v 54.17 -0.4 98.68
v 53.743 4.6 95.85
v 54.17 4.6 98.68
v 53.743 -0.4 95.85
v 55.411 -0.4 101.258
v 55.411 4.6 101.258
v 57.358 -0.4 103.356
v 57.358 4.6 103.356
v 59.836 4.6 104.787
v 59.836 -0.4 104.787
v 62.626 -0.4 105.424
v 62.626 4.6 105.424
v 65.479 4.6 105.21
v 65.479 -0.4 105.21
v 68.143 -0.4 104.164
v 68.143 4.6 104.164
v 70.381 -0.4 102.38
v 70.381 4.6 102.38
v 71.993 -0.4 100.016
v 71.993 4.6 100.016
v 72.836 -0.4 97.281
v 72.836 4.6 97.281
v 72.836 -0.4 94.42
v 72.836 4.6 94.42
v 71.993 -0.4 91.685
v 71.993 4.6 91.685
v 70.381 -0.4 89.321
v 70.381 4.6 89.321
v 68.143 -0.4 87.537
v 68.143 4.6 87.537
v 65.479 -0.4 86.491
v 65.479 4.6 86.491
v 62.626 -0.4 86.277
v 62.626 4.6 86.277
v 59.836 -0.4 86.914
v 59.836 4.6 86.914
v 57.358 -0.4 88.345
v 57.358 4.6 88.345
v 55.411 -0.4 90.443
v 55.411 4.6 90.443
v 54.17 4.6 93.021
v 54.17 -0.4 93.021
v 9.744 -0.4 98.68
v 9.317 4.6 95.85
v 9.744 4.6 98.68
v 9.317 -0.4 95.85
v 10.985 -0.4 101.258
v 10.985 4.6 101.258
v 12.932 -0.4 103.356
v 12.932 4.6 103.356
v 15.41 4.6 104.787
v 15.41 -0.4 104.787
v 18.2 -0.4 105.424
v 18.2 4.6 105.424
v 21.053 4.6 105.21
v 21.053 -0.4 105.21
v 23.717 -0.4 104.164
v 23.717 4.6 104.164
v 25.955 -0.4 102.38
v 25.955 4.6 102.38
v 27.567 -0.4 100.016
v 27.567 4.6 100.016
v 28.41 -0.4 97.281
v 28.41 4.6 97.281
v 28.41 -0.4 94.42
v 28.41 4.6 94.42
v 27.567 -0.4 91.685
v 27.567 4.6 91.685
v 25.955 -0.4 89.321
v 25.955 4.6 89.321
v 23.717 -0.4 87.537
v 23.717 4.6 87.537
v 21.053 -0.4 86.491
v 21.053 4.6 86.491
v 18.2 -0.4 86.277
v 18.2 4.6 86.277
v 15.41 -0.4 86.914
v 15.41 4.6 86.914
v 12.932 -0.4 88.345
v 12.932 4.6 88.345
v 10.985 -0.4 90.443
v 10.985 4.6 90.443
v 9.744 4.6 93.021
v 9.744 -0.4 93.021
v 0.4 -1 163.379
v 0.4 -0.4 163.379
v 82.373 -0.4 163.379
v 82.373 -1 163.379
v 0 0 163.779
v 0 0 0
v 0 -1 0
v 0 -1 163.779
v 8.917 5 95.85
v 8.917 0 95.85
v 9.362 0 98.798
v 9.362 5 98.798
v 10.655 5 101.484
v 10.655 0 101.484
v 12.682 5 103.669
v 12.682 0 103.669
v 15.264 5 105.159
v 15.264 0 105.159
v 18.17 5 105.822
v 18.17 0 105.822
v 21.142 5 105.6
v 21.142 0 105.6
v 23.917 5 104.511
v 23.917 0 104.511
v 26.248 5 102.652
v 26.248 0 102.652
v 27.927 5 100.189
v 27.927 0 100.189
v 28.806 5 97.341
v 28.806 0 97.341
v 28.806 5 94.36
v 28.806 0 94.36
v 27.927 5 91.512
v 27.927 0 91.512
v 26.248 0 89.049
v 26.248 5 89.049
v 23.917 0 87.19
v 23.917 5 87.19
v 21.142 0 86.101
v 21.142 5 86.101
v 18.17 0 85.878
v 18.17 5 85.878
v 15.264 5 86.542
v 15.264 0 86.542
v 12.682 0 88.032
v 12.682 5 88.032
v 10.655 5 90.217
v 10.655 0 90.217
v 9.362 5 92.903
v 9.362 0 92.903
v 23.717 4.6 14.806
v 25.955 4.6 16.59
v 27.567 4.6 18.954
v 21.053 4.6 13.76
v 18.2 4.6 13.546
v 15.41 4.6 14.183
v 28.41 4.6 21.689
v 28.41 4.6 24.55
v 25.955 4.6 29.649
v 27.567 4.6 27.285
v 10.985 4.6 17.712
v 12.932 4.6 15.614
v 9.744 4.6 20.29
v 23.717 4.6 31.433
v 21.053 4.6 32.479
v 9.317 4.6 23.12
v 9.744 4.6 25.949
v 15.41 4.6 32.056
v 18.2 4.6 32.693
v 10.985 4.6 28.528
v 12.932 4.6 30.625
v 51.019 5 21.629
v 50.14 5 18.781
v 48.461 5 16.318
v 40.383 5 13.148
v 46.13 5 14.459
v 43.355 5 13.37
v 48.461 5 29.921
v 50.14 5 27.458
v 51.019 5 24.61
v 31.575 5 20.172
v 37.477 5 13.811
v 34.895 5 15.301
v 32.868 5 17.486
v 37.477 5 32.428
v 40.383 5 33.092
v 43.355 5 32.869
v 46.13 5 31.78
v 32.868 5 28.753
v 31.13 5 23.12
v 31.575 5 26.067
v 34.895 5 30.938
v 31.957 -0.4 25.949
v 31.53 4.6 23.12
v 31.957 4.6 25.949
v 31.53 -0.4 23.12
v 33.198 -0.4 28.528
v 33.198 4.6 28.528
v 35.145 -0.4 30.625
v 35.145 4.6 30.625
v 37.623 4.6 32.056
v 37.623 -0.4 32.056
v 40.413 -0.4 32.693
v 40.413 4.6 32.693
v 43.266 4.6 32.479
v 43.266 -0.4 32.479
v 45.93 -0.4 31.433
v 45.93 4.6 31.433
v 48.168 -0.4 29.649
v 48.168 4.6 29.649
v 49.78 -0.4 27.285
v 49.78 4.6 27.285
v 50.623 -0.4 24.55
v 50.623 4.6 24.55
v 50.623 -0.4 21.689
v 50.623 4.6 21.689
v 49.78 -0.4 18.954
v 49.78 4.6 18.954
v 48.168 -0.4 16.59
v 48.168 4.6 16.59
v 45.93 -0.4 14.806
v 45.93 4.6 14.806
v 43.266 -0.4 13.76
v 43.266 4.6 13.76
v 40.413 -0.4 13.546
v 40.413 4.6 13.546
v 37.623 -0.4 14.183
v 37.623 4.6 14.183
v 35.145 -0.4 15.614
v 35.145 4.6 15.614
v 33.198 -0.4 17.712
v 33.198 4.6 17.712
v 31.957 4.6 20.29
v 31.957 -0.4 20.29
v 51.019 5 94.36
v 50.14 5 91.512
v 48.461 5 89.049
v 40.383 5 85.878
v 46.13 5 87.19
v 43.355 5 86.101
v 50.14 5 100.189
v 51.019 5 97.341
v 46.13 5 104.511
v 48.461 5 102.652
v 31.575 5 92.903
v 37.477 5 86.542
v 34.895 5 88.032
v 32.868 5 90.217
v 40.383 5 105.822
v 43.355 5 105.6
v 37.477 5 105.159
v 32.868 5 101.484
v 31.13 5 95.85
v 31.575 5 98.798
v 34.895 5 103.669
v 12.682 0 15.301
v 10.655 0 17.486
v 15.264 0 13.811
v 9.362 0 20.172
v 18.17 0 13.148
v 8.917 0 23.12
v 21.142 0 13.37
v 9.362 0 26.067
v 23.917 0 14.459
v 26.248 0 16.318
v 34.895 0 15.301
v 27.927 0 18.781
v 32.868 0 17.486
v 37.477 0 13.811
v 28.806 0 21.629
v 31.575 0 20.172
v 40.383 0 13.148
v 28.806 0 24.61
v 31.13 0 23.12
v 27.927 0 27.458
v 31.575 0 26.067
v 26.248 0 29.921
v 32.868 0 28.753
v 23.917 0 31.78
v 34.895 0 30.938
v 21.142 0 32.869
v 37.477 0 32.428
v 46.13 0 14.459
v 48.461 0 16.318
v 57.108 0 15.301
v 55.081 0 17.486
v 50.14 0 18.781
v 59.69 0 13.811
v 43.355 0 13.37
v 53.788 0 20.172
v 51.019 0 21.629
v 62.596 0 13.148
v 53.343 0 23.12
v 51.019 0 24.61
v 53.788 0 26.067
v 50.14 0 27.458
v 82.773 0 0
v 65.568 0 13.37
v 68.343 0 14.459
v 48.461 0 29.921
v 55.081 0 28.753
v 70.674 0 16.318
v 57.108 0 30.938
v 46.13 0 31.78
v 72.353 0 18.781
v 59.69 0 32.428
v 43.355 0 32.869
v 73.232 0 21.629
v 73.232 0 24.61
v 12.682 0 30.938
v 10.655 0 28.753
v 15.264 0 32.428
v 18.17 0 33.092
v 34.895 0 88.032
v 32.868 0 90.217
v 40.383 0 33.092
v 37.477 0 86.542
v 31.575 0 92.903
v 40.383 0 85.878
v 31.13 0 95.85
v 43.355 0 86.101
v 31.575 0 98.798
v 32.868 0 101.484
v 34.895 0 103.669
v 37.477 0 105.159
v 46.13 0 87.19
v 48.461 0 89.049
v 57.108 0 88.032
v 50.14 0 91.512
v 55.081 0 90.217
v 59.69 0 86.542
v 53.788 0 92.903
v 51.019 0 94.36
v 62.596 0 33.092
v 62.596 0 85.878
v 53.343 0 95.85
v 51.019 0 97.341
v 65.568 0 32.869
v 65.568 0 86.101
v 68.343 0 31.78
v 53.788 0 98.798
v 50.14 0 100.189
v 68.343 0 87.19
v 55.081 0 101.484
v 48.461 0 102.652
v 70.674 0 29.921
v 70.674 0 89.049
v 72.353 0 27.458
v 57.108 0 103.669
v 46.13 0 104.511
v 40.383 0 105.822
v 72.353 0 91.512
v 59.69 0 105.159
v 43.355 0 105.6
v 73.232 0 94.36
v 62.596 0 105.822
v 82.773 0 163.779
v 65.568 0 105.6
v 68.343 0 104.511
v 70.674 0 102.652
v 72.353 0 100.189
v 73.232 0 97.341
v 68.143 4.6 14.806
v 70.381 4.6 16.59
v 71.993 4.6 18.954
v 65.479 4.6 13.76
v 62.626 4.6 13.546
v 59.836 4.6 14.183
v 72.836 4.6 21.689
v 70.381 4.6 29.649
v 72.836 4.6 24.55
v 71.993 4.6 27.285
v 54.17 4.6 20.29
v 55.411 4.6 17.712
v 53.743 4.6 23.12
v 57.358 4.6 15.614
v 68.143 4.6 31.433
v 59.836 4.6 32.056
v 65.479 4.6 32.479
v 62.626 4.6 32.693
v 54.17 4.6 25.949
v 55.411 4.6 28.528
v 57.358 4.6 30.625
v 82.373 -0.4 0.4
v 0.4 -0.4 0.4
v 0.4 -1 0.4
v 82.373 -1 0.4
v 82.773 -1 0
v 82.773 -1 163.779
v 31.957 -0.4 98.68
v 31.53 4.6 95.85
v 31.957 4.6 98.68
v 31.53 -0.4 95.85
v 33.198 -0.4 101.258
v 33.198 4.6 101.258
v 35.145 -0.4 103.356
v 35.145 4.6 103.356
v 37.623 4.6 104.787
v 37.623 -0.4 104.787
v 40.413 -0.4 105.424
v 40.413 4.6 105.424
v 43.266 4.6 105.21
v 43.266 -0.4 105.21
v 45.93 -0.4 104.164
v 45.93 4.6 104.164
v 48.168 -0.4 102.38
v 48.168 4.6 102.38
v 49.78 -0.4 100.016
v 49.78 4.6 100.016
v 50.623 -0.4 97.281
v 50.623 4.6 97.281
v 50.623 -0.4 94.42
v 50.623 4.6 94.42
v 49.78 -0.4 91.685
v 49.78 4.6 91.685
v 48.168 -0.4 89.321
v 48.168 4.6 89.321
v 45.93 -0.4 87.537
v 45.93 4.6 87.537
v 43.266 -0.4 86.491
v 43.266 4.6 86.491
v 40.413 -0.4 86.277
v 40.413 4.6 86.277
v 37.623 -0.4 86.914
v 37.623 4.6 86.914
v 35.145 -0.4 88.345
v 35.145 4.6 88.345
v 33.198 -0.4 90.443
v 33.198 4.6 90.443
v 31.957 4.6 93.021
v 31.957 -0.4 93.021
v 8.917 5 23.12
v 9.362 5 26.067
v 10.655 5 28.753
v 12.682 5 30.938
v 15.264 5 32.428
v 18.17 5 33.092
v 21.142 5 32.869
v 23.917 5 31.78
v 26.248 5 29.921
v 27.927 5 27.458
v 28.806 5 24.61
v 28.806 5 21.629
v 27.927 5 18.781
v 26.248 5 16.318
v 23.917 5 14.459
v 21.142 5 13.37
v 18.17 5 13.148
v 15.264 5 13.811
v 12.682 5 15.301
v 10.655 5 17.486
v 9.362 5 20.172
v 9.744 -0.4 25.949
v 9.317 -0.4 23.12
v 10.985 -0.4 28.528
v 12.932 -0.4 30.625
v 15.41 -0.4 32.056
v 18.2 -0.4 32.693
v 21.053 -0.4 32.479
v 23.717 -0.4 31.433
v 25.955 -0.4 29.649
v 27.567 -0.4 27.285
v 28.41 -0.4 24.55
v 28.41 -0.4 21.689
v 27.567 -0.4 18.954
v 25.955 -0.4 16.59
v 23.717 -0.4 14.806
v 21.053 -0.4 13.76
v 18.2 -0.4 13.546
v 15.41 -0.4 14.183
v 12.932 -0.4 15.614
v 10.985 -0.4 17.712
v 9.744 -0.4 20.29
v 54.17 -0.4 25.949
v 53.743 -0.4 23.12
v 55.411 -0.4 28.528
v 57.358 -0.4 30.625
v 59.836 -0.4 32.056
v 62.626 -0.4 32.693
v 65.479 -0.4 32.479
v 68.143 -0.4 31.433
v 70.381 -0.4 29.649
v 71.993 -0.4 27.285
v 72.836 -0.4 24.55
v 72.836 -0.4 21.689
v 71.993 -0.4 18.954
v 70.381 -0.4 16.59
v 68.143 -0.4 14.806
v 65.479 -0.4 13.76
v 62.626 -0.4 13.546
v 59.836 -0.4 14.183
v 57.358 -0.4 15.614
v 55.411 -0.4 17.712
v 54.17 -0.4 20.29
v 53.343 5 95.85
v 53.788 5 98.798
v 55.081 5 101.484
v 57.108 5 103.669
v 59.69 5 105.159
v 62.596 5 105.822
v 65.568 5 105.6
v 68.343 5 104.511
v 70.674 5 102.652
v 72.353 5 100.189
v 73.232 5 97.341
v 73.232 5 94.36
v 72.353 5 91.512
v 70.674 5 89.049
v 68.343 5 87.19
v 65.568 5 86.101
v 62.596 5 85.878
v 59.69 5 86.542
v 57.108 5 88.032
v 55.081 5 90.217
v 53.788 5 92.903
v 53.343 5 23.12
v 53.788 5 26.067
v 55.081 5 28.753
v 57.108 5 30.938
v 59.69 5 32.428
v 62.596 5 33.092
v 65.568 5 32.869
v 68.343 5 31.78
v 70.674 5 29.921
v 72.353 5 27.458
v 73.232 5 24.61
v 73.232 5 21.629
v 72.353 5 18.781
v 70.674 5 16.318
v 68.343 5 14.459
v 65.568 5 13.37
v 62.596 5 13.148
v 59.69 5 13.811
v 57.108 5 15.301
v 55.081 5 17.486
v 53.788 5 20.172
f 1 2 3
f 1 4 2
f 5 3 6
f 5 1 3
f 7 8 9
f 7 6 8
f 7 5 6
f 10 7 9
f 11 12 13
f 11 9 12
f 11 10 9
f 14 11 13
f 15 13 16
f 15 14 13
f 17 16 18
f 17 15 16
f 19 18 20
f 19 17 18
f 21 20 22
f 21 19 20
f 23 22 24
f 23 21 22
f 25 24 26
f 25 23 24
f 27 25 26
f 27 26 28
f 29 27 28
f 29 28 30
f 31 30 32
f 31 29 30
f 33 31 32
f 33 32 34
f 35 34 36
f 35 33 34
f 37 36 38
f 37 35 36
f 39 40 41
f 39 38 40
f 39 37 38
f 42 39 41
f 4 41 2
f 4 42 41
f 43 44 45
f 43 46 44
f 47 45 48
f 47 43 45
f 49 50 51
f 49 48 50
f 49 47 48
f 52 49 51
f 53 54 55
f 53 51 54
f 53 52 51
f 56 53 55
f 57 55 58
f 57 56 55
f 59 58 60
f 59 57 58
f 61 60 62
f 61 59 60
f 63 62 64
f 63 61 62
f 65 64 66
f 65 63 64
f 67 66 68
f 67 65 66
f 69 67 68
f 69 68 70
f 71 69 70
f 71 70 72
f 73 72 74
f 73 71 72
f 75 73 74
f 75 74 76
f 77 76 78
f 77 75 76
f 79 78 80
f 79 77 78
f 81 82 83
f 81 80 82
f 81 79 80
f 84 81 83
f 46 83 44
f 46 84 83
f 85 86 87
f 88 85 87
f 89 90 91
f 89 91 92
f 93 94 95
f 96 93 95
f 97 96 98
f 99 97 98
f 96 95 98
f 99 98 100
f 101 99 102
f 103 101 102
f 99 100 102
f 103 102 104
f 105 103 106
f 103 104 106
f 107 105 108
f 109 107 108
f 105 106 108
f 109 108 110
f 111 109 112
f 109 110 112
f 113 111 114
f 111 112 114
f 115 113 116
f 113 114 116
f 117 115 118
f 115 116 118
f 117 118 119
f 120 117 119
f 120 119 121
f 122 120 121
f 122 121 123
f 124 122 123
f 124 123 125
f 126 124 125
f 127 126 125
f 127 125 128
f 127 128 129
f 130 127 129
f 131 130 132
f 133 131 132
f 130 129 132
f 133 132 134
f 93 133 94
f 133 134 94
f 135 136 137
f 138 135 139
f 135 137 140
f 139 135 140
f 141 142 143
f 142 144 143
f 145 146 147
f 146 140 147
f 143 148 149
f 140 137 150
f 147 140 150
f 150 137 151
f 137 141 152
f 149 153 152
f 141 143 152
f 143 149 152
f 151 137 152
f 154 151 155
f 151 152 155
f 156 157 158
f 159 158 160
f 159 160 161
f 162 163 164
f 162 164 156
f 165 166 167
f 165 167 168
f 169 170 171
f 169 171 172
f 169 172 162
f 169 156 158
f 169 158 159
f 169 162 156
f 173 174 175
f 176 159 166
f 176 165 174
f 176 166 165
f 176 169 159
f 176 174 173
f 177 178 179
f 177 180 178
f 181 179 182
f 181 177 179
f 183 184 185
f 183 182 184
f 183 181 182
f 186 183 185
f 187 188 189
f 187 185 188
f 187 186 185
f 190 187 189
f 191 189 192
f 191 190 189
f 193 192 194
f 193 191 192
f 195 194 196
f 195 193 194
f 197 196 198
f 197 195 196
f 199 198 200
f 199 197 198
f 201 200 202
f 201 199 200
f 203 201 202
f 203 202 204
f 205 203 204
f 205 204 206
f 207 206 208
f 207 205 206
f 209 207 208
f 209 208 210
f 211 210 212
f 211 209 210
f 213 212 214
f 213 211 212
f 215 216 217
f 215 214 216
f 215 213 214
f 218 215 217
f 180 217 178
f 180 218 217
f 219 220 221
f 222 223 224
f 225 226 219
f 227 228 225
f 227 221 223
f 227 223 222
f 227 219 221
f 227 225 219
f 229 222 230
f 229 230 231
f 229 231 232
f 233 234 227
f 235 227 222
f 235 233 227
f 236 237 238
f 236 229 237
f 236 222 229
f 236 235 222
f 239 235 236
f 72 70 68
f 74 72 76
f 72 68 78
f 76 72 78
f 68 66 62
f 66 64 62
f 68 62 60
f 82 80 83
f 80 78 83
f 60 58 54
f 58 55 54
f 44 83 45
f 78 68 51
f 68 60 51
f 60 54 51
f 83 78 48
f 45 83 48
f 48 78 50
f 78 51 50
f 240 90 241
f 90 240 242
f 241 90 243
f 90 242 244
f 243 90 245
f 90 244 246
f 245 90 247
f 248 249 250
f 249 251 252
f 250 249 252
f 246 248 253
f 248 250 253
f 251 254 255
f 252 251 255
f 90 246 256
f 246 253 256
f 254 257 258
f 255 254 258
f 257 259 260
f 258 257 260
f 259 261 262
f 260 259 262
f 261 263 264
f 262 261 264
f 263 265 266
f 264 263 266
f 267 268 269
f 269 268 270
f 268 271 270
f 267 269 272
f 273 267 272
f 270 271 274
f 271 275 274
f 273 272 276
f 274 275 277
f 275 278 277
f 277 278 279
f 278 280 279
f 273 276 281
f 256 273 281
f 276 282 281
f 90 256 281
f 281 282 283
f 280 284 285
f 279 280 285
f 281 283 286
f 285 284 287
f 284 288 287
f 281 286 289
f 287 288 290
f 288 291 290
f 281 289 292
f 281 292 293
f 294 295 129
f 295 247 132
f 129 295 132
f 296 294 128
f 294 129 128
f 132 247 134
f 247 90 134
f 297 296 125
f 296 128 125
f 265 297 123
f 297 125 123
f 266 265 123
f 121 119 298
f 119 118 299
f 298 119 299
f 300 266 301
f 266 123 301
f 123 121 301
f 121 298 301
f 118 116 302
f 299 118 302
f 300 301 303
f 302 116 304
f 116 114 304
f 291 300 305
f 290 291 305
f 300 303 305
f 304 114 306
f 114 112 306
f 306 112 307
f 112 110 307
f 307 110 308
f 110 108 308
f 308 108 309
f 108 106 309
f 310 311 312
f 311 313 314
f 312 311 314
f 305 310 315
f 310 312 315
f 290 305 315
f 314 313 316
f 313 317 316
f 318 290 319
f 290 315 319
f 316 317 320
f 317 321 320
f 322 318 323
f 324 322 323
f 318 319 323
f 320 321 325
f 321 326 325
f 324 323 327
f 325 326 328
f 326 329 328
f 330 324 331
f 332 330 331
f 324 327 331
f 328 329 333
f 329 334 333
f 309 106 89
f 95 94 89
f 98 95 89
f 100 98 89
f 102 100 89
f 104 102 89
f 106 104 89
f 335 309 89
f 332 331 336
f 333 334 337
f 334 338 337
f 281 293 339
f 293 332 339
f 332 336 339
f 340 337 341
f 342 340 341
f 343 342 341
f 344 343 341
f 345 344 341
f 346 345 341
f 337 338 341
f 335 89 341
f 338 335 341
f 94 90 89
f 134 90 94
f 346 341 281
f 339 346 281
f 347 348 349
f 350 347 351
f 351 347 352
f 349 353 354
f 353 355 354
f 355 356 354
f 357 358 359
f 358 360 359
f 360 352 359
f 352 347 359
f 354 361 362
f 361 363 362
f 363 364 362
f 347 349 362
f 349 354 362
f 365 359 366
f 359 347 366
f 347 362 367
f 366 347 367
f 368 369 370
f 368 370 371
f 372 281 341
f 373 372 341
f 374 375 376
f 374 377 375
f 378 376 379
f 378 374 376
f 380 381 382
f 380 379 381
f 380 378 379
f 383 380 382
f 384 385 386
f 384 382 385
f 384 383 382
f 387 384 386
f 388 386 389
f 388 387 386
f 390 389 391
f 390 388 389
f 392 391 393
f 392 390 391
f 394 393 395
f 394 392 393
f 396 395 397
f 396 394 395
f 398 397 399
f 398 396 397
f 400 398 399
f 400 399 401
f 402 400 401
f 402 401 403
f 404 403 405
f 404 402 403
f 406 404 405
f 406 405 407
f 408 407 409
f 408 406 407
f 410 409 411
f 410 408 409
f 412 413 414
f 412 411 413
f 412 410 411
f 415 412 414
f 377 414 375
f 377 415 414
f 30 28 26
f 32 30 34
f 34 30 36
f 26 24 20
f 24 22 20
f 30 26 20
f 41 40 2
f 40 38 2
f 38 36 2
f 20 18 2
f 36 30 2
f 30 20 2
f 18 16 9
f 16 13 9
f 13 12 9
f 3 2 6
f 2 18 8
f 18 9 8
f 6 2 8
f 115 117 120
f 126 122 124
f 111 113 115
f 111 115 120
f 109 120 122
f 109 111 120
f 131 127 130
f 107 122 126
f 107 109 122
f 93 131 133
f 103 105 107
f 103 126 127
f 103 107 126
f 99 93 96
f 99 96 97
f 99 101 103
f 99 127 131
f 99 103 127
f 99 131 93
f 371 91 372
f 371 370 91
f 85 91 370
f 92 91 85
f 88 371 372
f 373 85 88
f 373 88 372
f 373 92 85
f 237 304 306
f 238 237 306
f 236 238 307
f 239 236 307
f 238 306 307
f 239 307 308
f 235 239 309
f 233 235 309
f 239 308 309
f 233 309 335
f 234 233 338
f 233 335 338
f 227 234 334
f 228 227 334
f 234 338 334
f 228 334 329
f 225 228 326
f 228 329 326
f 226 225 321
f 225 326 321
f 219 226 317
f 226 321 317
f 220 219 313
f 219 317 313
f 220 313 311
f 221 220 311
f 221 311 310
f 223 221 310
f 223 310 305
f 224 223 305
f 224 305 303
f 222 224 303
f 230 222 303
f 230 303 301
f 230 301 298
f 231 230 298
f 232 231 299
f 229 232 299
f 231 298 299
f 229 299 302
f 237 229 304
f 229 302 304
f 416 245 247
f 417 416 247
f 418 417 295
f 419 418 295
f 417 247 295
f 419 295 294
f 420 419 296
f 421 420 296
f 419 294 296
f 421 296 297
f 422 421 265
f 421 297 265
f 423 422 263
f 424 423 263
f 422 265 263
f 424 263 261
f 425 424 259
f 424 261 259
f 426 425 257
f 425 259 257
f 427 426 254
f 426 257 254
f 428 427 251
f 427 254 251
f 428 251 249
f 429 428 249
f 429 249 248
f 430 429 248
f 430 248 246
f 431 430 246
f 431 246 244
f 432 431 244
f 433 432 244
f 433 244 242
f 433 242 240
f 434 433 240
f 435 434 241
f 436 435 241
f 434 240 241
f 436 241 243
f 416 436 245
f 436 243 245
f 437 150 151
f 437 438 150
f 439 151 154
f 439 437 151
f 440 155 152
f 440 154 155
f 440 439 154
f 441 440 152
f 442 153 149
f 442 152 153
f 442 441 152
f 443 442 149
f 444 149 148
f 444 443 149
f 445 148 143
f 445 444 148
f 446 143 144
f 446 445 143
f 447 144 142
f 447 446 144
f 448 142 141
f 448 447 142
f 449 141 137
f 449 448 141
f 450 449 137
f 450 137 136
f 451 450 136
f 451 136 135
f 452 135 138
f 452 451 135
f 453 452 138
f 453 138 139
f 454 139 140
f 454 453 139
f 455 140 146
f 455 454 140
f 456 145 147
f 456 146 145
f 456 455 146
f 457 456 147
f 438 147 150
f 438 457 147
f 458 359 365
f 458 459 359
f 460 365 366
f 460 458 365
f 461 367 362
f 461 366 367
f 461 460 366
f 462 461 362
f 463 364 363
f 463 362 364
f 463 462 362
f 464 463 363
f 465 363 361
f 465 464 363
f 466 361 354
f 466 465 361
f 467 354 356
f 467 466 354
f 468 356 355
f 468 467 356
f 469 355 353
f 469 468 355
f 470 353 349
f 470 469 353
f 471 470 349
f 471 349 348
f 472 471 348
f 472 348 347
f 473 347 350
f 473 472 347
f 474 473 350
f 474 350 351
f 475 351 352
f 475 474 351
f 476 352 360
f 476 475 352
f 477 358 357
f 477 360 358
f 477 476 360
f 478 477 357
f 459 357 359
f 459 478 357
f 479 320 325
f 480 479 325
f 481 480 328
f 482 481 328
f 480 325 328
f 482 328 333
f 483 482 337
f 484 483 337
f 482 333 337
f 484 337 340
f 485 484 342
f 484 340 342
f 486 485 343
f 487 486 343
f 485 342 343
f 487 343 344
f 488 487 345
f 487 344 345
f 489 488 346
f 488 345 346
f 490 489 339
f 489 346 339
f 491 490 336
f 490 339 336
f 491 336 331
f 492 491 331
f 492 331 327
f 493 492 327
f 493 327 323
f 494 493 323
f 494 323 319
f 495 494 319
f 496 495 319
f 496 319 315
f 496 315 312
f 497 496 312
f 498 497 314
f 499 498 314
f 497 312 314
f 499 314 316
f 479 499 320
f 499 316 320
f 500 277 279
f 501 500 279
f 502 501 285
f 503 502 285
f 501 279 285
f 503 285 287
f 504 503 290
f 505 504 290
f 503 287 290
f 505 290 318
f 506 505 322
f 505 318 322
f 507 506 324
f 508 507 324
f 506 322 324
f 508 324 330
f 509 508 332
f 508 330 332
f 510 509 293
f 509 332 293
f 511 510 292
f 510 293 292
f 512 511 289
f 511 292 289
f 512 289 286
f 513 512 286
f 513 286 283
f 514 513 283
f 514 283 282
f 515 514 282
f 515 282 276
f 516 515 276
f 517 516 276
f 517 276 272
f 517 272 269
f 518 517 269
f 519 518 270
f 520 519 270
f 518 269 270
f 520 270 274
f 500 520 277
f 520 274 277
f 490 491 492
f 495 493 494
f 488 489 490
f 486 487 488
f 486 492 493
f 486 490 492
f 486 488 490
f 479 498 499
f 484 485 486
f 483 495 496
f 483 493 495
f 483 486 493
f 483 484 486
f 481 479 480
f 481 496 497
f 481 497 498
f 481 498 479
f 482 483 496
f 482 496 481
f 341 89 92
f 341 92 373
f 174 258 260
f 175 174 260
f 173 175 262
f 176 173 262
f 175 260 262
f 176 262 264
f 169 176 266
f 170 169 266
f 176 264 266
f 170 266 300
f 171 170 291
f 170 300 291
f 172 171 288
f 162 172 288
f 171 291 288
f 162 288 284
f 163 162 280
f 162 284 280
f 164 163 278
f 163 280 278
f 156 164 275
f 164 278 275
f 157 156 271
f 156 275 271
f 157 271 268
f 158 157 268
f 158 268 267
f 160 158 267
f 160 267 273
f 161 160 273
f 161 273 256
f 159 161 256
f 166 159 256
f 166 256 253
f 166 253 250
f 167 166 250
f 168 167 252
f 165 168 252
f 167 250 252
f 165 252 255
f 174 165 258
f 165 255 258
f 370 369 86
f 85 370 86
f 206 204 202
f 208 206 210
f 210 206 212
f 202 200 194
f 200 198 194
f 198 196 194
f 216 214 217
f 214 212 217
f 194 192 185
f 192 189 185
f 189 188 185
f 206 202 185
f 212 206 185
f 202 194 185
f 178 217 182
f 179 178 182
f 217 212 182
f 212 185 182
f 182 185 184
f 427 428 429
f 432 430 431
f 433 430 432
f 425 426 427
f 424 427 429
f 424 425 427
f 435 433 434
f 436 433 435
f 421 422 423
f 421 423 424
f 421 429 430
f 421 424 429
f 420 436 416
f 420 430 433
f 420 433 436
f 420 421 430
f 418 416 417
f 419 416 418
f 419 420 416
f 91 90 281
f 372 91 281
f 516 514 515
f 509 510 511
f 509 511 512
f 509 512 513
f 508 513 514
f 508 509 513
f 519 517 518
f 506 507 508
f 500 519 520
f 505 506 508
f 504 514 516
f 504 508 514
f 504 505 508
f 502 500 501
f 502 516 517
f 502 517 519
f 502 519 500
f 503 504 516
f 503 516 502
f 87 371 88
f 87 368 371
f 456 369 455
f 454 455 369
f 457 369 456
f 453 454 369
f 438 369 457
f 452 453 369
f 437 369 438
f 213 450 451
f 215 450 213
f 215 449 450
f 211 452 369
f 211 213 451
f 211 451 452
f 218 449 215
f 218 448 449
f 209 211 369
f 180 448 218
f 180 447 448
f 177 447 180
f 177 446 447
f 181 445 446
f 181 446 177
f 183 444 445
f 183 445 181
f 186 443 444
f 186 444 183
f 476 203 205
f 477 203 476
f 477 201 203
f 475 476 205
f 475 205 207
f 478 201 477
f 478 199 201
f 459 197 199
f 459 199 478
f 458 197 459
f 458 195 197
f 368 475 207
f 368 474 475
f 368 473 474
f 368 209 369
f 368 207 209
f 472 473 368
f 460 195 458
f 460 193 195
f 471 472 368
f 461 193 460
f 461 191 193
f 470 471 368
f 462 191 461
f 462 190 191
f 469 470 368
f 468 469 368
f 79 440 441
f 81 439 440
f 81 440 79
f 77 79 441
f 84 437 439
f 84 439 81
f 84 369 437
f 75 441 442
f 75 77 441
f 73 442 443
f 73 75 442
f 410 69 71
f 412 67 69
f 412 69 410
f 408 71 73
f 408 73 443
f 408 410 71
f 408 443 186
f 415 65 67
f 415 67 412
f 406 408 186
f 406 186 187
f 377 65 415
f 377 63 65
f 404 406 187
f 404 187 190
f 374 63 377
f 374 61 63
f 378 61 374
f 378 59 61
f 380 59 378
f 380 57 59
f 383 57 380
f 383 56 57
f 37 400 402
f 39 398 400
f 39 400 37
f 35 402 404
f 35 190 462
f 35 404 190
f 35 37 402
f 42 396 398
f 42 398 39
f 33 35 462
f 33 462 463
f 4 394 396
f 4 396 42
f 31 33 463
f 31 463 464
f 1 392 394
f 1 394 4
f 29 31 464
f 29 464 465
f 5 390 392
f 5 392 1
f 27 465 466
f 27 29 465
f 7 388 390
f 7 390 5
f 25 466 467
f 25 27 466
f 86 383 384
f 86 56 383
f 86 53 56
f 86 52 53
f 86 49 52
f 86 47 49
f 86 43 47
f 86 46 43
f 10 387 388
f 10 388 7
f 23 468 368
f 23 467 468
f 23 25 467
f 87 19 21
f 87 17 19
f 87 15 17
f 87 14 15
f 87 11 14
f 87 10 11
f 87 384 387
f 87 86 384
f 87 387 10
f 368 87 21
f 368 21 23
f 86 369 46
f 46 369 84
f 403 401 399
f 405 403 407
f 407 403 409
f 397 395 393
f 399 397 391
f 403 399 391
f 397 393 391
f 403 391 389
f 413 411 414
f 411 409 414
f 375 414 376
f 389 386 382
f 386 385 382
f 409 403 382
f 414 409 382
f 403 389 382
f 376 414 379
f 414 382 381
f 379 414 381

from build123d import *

# Parameters (mm, degrees)
F0_W     = 82.7734842896
F0_H     = 163.7785583735
F1_DEPTH = 1
F2_R     = 10
F3_DEPTH = 5
F4_T     = -0.4


with BuildPart() as f1:
    # F0 (on Front) → F1 (new body)
    with BuildSketch(Plane.XZ):
        with Locations((41.3867421448, 81.8892791867)):
            Rectangle(F0_W, F0_H)
    extrude(amount=F1_DEPTH)

    # F2 (on face) → F3 (join)
    with BuildSketch(Plane(origin=(0, 0, 0), x_dir=(-1, 0, 0), z_dir=(0, 1, 0))):
        with Locations((-18.917247653, 23.1196433306)):
            Circle(F2_R)
        with Locations((-18.917247653, 95.850430429)):
            Circle(F2_R)
        with Locations((-41.1302503198, 23.1196433306)):
            Circle(F2_R)
        with Locations((-41.1302503198, 95.850430429)):
            Circle(F2_R)
        with Locations((-63.3432529867, 23.1196433306)):
            Circle(F2_R)
        with Locations((-63.3432529867, 95.850430429)):
            Circle(F2_R)
    extrude(amount=F3_DEPTH)

    # F4
    f4_openings = [f1.faces().sort_by_distance(p)[0] for p in [
        (41.386742, -1, 81.889279),
    ]]
    offset(amount=F4_T, openings=f4_openings, kind=Kind.INTERSECTION)


solid = f1.part
